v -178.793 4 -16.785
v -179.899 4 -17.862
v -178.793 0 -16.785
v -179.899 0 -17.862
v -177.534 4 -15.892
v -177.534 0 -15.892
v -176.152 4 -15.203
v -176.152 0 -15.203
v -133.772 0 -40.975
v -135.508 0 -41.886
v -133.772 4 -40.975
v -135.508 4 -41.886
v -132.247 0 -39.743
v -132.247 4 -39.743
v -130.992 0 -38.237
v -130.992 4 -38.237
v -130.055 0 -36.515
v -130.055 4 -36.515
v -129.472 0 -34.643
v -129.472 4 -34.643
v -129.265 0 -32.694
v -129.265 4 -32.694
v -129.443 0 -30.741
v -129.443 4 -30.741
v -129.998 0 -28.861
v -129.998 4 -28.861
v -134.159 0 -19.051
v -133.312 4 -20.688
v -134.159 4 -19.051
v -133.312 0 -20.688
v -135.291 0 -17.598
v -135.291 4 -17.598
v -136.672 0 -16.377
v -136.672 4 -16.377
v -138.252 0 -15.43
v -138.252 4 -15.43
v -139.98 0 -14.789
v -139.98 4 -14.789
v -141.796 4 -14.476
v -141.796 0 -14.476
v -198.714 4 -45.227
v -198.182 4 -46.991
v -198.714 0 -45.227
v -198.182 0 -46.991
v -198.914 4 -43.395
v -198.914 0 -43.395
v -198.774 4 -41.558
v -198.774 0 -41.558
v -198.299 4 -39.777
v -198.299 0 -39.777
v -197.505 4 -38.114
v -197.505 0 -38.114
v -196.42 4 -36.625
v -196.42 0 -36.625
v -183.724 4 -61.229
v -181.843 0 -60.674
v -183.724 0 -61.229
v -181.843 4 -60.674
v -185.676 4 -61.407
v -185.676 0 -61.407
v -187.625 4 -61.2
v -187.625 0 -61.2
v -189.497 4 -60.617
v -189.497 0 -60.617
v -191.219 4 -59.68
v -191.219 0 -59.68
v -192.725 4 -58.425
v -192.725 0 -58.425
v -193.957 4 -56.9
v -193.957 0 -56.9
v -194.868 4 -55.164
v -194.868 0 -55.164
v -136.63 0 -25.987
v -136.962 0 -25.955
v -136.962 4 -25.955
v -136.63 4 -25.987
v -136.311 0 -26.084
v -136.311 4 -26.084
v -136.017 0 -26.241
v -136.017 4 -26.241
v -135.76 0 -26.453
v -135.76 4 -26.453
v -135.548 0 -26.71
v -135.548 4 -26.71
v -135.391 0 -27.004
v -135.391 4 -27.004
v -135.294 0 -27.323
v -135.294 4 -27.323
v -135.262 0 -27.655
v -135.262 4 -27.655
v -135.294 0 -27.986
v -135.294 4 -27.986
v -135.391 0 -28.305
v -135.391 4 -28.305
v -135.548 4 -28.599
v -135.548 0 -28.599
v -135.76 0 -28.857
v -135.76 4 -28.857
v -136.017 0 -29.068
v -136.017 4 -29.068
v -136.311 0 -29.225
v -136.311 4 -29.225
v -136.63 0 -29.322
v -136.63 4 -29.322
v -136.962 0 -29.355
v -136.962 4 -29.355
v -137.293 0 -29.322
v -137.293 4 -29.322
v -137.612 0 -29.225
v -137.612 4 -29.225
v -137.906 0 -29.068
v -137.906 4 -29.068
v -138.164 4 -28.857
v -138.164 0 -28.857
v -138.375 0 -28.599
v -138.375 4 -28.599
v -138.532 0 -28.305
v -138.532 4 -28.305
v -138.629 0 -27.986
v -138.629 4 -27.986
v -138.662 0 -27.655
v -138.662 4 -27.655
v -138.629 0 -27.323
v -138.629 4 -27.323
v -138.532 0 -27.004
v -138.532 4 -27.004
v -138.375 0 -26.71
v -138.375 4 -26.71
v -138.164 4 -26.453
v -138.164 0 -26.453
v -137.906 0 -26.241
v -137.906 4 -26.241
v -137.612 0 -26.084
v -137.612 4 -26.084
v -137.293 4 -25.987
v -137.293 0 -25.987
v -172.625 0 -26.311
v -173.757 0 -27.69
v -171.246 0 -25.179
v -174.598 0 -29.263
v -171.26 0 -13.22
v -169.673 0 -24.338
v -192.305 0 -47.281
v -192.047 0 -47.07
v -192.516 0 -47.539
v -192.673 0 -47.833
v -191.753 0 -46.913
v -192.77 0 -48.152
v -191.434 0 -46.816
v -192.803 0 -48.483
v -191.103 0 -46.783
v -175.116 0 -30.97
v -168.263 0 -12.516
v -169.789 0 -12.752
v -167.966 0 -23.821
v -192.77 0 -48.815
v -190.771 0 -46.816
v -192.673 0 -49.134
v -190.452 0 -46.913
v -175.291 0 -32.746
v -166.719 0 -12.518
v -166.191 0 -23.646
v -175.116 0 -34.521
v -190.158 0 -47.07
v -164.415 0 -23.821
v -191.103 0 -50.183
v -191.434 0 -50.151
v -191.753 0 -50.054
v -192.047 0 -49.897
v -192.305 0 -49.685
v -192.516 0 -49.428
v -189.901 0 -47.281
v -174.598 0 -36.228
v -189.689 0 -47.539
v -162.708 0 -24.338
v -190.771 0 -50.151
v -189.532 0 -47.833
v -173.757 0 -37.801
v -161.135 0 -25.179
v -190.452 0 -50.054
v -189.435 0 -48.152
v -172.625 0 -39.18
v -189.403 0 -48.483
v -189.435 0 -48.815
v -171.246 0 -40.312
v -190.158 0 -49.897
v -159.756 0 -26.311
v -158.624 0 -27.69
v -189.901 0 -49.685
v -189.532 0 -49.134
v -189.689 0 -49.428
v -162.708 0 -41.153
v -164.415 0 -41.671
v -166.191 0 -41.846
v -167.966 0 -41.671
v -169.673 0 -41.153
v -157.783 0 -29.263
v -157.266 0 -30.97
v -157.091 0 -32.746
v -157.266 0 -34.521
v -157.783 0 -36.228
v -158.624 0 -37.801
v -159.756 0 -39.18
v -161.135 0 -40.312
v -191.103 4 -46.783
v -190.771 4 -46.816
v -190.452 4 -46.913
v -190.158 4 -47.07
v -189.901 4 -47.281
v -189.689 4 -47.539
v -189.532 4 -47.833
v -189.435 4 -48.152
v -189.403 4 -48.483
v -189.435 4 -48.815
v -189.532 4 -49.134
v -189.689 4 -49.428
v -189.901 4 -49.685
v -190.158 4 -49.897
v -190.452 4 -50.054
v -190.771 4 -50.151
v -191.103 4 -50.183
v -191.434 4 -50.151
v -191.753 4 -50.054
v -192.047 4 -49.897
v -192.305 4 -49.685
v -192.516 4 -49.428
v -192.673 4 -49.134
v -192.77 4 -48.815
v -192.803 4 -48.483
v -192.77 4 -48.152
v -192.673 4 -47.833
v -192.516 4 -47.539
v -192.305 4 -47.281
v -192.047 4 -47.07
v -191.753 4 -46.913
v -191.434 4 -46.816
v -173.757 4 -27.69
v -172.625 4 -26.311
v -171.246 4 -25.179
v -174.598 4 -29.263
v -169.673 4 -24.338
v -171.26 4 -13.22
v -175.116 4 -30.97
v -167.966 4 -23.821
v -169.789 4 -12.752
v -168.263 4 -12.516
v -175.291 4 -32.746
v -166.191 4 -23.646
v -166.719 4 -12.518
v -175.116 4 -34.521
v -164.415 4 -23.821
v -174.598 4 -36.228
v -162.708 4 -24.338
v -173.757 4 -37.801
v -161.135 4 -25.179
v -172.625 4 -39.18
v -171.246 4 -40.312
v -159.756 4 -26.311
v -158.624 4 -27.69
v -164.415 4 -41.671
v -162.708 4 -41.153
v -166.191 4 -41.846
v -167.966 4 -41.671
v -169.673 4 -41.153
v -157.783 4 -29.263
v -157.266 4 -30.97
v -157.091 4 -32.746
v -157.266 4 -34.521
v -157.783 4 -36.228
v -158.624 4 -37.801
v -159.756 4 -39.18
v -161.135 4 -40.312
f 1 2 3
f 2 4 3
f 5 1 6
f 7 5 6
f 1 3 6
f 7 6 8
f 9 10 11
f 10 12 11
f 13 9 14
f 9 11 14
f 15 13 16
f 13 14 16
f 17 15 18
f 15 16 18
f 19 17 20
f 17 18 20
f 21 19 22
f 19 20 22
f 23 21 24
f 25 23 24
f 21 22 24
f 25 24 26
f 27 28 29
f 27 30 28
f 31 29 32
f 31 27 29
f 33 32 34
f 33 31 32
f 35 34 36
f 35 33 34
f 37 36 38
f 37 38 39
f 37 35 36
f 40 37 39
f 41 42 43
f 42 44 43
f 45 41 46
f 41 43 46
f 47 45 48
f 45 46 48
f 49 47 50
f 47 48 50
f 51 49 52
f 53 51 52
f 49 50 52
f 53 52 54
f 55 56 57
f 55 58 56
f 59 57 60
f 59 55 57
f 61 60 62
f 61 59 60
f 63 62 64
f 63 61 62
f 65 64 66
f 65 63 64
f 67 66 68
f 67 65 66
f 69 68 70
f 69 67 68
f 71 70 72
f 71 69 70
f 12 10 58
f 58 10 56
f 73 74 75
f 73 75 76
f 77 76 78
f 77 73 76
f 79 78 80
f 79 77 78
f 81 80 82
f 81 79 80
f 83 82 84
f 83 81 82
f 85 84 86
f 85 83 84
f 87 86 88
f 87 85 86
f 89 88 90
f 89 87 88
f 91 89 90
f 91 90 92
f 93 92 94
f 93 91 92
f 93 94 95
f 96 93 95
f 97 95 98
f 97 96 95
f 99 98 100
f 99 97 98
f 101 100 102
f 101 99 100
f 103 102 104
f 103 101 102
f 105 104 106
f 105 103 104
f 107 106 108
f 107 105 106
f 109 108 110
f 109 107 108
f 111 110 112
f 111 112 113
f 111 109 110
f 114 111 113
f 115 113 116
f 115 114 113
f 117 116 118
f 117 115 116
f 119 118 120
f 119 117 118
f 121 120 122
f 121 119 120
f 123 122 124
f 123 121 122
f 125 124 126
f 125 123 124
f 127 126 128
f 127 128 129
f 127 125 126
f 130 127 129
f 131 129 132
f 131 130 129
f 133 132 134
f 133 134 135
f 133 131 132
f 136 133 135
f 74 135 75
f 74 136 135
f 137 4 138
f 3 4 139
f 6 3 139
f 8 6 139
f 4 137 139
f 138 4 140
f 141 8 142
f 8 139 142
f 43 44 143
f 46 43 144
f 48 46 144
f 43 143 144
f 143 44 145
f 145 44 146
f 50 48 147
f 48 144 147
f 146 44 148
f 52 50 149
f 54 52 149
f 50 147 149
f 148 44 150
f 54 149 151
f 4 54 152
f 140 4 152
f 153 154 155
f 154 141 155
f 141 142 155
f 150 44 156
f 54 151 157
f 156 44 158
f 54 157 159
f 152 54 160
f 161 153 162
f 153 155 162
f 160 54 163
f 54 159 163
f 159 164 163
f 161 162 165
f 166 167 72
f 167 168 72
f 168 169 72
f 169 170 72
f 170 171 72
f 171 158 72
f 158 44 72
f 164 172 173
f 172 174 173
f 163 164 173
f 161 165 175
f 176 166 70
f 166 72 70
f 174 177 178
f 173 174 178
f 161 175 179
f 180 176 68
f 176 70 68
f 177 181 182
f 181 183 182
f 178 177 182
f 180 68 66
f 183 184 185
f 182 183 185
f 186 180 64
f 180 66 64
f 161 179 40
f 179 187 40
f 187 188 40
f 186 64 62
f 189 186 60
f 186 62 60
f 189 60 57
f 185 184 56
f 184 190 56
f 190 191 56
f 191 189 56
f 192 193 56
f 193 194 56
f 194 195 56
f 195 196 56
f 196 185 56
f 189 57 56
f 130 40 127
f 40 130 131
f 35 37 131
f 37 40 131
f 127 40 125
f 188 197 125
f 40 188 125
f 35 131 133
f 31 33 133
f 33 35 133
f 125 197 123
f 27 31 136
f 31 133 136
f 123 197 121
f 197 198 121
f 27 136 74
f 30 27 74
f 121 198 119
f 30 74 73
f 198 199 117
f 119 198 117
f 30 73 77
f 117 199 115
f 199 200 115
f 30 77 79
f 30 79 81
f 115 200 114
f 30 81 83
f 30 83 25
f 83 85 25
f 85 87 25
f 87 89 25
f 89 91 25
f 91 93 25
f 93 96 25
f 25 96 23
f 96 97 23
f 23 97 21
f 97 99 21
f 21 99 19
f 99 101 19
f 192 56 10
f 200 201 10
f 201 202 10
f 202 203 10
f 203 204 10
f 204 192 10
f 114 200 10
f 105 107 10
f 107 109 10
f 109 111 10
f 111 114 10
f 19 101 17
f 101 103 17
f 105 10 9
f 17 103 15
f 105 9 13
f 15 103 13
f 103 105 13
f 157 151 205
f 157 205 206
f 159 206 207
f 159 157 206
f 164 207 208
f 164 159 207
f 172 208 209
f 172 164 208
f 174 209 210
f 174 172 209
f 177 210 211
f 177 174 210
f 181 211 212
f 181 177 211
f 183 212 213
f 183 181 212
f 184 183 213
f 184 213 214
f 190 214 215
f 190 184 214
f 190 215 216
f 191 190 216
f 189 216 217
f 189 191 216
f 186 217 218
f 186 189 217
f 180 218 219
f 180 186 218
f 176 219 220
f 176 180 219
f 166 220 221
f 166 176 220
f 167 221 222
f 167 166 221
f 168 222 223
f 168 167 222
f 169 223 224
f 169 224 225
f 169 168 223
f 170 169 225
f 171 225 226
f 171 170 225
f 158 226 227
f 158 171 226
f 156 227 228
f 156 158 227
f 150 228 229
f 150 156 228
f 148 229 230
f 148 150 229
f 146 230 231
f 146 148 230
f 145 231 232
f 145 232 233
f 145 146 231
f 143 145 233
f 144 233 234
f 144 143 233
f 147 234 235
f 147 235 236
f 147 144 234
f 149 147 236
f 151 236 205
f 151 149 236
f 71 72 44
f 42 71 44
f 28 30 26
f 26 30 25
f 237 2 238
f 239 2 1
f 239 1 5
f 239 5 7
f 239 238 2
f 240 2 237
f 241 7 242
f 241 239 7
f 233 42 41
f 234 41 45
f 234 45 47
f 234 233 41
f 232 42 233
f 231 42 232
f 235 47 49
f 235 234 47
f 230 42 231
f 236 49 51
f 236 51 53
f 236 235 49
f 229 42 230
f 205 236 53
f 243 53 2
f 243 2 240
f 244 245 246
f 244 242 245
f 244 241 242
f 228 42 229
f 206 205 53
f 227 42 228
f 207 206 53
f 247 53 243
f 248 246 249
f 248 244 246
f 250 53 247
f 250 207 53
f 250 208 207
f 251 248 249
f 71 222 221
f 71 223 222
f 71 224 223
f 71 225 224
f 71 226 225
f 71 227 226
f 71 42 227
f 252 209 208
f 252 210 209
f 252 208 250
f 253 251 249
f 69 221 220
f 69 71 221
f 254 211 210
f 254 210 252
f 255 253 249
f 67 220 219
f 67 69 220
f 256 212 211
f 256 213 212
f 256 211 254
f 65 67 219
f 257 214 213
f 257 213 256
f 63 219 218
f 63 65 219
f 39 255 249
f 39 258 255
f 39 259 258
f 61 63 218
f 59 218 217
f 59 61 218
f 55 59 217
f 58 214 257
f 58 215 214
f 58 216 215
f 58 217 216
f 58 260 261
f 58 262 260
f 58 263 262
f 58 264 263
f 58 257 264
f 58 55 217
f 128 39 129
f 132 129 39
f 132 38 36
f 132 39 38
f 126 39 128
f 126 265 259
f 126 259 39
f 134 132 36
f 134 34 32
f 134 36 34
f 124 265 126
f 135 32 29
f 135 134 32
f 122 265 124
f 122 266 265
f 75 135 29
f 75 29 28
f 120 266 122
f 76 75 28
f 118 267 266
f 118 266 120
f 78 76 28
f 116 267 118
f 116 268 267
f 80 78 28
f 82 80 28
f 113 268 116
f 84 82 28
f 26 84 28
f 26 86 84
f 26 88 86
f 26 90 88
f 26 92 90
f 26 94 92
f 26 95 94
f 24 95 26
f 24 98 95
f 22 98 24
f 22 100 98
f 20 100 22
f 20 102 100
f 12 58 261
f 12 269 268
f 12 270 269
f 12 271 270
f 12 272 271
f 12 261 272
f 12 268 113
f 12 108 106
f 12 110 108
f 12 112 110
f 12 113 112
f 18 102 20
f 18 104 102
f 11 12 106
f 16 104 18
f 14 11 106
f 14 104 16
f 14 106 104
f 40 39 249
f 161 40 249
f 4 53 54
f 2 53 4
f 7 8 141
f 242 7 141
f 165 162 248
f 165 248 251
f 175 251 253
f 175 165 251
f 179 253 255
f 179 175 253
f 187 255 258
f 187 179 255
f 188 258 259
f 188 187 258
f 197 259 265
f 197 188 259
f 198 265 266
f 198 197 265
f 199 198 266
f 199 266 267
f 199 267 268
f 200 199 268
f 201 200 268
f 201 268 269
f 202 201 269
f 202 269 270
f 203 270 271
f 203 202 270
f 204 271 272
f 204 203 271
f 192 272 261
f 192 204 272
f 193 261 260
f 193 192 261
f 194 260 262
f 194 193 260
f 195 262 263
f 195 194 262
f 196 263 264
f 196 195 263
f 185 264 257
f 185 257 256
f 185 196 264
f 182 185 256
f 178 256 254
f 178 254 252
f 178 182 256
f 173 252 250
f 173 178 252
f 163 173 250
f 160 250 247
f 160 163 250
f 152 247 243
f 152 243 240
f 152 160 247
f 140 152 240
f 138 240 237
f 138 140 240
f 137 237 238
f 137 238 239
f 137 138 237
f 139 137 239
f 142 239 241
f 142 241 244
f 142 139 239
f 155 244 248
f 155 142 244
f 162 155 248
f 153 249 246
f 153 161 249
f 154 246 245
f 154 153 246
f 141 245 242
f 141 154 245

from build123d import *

# Parameters (mm, degrees)
SKETCH_1_R          = 1.7
SKETCH_1_R_2        = 9.1
EXTRUDE_1_DEPTH     = 4
CUT_EXTRUDE_1_DEPTH = 4
FILLET_1_R          = 10


with BuildPart() as part:
    # 草图1 → 凸台-拉伸1 (new body)
    with BuildSketch(Plane(origin=(0, 0, 0), x_dir=(1, 0, 0), z_dir=(0, 1, 0))):
        Polygon((-126.240398859, 38.128502465), (-191.110616974, 64.43163539), (-206.140978645, 27.362939325), (-141.27076053, 1.059806399), align=None)
        with Locations(Location((-136.961696425, 27.654734478, 0), (0, 0, 270))):
            Circle(SKETCH_1_R, mode=Mode.SUBTRACT)
        with Locations(Location((-191.102800779, 48.48323248, 0), (0, 0, 270))):
            Circle(SKETCH_1_R, mode=Mode.SUBTRACT)
        with Locations(Location((-166.190688752, 32.745720895, 0), (0, 0, 270))):
            Circle(SKETCH_1_R_2, mode=Mode.SUBTRACT)
    extrude(amount=EXTRUDE_1_DEPTH)

    # 草图2 → 切除-拉伸1 (cut)
    with BuildSketch(Plane(origin=(0, 4, 0), x_dir=(1, 0, 0), z_dir=(0, 1, 0))):
        Polygon((-135.634374903, 14.960567424), (-169.07228258, 12.332577653), (-141.27076053, 1.059806399), align=None)
        Polygon((-200.504593019, 41.263700349), (-178.339456596, 16.090168071), (-206.140978645, 27.362939325), align=None)
    extrude(amount=-CUT_EXTRUDE_1_DEPTH, mode=Mode.SUBTRACT)

    # 圆角1
    fillet_1_edges = [part.edges().sort_by_distance(p)[0] for p in [
        (-135.634374903, 2, -14.960567424),
        (-169.07228258, 2, -12.332577653),
        (-200.504593019, 2, -41.263700349),
        (-178.339456596, 2, -16.090168071),
        (-191.110616974, 2, -64.43163539),
        (-126.240398859, 2, -38.128502465),
    ]]
    fillet(fillet_1_edges, radius=FILLET_1_R)


solid = part.part
